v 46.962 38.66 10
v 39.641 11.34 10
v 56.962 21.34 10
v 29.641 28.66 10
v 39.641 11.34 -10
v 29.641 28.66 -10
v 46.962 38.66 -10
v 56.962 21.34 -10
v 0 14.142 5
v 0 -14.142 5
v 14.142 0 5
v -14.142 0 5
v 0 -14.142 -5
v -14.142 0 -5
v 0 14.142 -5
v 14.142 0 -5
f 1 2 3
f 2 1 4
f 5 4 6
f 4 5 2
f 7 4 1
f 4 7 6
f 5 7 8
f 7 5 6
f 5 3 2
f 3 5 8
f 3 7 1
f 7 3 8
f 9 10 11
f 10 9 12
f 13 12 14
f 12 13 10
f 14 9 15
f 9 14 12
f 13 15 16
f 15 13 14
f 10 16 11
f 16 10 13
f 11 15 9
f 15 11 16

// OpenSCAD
//-- Ejemplo de translación y rotación

//-- Traslación y rotación de un cubo

rotate([0,0,30])
    translate([50,0,0])
        cube([20,20,20],center=true);

//-- Rotación de un cubo

rotate([0,0,45])
    cube([20,20,10],center=true);
